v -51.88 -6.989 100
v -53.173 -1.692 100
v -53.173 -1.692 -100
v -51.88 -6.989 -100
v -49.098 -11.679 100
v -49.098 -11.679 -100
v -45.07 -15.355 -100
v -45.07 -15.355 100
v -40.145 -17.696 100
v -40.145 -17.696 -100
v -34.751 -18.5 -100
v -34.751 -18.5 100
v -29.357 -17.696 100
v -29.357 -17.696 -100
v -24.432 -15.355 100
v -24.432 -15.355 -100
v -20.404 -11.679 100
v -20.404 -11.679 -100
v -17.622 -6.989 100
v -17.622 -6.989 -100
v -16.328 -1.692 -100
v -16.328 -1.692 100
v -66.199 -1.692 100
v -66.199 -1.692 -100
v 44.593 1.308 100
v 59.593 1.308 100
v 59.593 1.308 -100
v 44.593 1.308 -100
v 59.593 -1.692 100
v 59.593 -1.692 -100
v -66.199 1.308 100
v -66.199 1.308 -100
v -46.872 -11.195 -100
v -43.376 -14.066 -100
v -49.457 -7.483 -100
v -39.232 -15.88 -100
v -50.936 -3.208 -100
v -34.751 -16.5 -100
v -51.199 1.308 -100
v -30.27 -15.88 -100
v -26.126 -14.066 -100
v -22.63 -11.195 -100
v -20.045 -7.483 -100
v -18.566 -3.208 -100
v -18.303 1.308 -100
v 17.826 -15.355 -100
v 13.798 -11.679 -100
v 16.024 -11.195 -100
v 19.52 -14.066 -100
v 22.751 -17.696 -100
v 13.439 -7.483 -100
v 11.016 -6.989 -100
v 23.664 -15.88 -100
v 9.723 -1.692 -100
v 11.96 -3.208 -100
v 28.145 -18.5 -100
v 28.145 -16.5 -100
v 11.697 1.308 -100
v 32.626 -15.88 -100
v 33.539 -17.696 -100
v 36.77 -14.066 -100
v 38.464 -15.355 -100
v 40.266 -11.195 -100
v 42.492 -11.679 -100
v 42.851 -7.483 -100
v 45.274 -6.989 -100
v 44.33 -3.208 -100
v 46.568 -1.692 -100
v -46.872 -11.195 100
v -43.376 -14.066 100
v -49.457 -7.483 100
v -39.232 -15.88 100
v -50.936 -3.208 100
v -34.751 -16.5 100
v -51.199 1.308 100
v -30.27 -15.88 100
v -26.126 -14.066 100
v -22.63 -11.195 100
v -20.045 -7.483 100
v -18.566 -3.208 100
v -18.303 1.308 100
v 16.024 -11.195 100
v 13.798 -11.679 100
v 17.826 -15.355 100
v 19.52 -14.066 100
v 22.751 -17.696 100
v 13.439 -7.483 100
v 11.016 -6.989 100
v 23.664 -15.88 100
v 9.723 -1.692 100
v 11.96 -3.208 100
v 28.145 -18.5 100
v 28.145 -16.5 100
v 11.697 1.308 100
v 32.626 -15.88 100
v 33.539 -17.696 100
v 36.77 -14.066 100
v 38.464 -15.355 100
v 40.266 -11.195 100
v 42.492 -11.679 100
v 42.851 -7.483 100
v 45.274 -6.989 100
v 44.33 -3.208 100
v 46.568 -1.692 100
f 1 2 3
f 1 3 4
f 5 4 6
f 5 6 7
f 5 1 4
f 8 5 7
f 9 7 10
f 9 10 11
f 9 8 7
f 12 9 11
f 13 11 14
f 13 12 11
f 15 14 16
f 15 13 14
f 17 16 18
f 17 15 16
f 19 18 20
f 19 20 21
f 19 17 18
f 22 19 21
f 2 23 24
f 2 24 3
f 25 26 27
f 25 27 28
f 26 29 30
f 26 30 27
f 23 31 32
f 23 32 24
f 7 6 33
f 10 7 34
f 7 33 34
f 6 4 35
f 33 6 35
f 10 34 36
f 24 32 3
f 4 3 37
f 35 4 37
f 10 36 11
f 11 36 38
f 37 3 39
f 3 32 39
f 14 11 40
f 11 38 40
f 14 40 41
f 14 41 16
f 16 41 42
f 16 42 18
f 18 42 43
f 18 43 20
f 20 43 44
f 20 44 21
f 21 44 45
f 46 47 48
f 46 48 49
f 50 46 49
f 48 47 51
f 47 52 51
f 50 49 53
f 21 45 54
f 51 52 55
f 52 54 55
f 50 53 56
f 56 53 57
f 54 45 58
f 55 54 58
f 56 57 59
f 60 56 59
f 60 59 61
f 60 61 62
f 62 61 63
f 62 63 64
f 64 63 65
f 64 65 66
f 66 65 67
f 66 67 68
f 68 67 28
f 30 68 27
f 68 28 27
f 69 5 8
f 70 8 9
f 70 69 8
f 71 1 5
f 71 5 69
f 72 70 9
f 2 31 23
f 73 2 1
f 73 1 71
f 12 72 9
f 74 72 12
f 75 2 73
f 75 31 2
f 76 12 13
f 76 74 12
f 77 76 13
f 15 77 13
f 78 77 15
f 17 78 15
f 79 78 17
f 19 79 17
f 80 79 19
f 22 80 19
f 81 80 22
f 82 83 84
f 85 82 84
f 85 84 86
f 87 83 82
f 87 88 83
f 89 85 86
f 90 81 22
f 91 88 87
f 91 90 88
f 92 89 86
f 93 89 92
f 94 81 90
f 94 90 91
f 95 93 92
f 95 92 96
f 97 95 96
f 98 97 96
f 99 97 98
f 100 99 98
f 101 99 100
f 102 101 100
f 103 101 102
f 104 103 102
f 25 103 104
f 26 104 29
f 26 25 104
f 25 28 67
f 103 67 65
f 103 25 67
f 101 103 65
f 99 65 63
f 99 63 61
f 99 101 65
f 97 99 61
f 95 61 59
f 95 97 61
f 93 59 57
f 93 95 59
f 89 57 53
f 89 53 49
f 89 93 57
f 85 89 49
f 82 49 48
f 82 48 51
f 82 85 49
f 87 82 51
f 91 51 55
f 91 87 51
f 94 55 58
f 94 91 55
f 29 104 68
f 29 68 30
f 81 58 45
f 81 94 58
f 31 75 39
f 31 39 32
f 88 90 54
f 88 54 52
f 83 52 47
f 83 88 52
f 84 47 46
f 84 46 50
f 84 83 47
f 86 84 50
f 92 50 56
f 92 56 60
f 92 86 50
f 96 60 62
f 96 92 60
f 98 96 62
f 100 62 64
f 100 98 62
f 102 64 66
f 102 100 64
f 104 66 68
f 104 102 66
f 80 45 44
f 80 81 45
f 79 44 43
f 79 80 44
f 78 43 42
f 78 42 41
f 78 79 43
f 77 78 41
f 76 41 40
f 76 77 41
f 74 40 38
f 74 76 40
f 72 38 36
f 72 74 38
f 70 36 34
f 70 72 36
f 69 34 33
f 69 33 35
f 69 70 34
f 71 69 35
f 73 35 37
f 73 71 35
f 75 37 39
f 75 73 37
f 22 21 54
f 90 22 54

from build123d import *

# Parameters (mm, degrees)
F1_DEPTH      = 100
F1_DEPTH_BACK = 100


with BuildPart() as f1:
    # F0 (on Top) → F1 (new body, two sides)
    with BuildSketch(Plane.XY) as f1_sk:
        with BuildLine():
            ThreePointArc((-18.302896, 1.308424), (-34.750936, -16.5), (-51.198977, 1.308424))
            Line((-51.198977, 1.308424), (-53.204609, 1.308424))
            Line((-53.204609, 1.308424), (-66.198977, 1.308424))
            Line((-66.198977, 1.308424), (-66.198977, -1.691576))
            Line((-66.198977, -1.691576), (-53.173438, -1.691576))
            ThreePointArc((-53.173438, -1.691576), (-34.750936, -18.5), (-16.328435, -1.691576))
            Line((-16.328435, -1.691576), (9.722642, -1.691576))
            ThreePointArc((9.722642, -1.691576), (28.145144, -18.5), (46.567646, -1.691576))
            Line((46.567646, -1.691576), (59.593184, -1.691576))
            Line((59.593184, -1.691576), (59.593184, 1.308424))
            Line((59.593184, 1.308424), (46.598816, 1.308424))
            Line((46.598816, 1.308424), (44.593184, 1.308424))
            ThreePointArc((44.593184, 1.308424), (28.145144, -16.5), (11.697104, 1.308424))
            Line((11.697104, 1.308424), (9.691472, 1.308424))
            Line((9.691472, 1.308424), (-16.297264, 1.308424))
            Line((-16.297264, 1.308424), (-18.302896, 1.308424))
        make_face()
    extrude(amount=F1_DEPTH)
    extrude(f1_sk.sketch, amount=-F1_DEPTH_BACK)


solid = f1.part
